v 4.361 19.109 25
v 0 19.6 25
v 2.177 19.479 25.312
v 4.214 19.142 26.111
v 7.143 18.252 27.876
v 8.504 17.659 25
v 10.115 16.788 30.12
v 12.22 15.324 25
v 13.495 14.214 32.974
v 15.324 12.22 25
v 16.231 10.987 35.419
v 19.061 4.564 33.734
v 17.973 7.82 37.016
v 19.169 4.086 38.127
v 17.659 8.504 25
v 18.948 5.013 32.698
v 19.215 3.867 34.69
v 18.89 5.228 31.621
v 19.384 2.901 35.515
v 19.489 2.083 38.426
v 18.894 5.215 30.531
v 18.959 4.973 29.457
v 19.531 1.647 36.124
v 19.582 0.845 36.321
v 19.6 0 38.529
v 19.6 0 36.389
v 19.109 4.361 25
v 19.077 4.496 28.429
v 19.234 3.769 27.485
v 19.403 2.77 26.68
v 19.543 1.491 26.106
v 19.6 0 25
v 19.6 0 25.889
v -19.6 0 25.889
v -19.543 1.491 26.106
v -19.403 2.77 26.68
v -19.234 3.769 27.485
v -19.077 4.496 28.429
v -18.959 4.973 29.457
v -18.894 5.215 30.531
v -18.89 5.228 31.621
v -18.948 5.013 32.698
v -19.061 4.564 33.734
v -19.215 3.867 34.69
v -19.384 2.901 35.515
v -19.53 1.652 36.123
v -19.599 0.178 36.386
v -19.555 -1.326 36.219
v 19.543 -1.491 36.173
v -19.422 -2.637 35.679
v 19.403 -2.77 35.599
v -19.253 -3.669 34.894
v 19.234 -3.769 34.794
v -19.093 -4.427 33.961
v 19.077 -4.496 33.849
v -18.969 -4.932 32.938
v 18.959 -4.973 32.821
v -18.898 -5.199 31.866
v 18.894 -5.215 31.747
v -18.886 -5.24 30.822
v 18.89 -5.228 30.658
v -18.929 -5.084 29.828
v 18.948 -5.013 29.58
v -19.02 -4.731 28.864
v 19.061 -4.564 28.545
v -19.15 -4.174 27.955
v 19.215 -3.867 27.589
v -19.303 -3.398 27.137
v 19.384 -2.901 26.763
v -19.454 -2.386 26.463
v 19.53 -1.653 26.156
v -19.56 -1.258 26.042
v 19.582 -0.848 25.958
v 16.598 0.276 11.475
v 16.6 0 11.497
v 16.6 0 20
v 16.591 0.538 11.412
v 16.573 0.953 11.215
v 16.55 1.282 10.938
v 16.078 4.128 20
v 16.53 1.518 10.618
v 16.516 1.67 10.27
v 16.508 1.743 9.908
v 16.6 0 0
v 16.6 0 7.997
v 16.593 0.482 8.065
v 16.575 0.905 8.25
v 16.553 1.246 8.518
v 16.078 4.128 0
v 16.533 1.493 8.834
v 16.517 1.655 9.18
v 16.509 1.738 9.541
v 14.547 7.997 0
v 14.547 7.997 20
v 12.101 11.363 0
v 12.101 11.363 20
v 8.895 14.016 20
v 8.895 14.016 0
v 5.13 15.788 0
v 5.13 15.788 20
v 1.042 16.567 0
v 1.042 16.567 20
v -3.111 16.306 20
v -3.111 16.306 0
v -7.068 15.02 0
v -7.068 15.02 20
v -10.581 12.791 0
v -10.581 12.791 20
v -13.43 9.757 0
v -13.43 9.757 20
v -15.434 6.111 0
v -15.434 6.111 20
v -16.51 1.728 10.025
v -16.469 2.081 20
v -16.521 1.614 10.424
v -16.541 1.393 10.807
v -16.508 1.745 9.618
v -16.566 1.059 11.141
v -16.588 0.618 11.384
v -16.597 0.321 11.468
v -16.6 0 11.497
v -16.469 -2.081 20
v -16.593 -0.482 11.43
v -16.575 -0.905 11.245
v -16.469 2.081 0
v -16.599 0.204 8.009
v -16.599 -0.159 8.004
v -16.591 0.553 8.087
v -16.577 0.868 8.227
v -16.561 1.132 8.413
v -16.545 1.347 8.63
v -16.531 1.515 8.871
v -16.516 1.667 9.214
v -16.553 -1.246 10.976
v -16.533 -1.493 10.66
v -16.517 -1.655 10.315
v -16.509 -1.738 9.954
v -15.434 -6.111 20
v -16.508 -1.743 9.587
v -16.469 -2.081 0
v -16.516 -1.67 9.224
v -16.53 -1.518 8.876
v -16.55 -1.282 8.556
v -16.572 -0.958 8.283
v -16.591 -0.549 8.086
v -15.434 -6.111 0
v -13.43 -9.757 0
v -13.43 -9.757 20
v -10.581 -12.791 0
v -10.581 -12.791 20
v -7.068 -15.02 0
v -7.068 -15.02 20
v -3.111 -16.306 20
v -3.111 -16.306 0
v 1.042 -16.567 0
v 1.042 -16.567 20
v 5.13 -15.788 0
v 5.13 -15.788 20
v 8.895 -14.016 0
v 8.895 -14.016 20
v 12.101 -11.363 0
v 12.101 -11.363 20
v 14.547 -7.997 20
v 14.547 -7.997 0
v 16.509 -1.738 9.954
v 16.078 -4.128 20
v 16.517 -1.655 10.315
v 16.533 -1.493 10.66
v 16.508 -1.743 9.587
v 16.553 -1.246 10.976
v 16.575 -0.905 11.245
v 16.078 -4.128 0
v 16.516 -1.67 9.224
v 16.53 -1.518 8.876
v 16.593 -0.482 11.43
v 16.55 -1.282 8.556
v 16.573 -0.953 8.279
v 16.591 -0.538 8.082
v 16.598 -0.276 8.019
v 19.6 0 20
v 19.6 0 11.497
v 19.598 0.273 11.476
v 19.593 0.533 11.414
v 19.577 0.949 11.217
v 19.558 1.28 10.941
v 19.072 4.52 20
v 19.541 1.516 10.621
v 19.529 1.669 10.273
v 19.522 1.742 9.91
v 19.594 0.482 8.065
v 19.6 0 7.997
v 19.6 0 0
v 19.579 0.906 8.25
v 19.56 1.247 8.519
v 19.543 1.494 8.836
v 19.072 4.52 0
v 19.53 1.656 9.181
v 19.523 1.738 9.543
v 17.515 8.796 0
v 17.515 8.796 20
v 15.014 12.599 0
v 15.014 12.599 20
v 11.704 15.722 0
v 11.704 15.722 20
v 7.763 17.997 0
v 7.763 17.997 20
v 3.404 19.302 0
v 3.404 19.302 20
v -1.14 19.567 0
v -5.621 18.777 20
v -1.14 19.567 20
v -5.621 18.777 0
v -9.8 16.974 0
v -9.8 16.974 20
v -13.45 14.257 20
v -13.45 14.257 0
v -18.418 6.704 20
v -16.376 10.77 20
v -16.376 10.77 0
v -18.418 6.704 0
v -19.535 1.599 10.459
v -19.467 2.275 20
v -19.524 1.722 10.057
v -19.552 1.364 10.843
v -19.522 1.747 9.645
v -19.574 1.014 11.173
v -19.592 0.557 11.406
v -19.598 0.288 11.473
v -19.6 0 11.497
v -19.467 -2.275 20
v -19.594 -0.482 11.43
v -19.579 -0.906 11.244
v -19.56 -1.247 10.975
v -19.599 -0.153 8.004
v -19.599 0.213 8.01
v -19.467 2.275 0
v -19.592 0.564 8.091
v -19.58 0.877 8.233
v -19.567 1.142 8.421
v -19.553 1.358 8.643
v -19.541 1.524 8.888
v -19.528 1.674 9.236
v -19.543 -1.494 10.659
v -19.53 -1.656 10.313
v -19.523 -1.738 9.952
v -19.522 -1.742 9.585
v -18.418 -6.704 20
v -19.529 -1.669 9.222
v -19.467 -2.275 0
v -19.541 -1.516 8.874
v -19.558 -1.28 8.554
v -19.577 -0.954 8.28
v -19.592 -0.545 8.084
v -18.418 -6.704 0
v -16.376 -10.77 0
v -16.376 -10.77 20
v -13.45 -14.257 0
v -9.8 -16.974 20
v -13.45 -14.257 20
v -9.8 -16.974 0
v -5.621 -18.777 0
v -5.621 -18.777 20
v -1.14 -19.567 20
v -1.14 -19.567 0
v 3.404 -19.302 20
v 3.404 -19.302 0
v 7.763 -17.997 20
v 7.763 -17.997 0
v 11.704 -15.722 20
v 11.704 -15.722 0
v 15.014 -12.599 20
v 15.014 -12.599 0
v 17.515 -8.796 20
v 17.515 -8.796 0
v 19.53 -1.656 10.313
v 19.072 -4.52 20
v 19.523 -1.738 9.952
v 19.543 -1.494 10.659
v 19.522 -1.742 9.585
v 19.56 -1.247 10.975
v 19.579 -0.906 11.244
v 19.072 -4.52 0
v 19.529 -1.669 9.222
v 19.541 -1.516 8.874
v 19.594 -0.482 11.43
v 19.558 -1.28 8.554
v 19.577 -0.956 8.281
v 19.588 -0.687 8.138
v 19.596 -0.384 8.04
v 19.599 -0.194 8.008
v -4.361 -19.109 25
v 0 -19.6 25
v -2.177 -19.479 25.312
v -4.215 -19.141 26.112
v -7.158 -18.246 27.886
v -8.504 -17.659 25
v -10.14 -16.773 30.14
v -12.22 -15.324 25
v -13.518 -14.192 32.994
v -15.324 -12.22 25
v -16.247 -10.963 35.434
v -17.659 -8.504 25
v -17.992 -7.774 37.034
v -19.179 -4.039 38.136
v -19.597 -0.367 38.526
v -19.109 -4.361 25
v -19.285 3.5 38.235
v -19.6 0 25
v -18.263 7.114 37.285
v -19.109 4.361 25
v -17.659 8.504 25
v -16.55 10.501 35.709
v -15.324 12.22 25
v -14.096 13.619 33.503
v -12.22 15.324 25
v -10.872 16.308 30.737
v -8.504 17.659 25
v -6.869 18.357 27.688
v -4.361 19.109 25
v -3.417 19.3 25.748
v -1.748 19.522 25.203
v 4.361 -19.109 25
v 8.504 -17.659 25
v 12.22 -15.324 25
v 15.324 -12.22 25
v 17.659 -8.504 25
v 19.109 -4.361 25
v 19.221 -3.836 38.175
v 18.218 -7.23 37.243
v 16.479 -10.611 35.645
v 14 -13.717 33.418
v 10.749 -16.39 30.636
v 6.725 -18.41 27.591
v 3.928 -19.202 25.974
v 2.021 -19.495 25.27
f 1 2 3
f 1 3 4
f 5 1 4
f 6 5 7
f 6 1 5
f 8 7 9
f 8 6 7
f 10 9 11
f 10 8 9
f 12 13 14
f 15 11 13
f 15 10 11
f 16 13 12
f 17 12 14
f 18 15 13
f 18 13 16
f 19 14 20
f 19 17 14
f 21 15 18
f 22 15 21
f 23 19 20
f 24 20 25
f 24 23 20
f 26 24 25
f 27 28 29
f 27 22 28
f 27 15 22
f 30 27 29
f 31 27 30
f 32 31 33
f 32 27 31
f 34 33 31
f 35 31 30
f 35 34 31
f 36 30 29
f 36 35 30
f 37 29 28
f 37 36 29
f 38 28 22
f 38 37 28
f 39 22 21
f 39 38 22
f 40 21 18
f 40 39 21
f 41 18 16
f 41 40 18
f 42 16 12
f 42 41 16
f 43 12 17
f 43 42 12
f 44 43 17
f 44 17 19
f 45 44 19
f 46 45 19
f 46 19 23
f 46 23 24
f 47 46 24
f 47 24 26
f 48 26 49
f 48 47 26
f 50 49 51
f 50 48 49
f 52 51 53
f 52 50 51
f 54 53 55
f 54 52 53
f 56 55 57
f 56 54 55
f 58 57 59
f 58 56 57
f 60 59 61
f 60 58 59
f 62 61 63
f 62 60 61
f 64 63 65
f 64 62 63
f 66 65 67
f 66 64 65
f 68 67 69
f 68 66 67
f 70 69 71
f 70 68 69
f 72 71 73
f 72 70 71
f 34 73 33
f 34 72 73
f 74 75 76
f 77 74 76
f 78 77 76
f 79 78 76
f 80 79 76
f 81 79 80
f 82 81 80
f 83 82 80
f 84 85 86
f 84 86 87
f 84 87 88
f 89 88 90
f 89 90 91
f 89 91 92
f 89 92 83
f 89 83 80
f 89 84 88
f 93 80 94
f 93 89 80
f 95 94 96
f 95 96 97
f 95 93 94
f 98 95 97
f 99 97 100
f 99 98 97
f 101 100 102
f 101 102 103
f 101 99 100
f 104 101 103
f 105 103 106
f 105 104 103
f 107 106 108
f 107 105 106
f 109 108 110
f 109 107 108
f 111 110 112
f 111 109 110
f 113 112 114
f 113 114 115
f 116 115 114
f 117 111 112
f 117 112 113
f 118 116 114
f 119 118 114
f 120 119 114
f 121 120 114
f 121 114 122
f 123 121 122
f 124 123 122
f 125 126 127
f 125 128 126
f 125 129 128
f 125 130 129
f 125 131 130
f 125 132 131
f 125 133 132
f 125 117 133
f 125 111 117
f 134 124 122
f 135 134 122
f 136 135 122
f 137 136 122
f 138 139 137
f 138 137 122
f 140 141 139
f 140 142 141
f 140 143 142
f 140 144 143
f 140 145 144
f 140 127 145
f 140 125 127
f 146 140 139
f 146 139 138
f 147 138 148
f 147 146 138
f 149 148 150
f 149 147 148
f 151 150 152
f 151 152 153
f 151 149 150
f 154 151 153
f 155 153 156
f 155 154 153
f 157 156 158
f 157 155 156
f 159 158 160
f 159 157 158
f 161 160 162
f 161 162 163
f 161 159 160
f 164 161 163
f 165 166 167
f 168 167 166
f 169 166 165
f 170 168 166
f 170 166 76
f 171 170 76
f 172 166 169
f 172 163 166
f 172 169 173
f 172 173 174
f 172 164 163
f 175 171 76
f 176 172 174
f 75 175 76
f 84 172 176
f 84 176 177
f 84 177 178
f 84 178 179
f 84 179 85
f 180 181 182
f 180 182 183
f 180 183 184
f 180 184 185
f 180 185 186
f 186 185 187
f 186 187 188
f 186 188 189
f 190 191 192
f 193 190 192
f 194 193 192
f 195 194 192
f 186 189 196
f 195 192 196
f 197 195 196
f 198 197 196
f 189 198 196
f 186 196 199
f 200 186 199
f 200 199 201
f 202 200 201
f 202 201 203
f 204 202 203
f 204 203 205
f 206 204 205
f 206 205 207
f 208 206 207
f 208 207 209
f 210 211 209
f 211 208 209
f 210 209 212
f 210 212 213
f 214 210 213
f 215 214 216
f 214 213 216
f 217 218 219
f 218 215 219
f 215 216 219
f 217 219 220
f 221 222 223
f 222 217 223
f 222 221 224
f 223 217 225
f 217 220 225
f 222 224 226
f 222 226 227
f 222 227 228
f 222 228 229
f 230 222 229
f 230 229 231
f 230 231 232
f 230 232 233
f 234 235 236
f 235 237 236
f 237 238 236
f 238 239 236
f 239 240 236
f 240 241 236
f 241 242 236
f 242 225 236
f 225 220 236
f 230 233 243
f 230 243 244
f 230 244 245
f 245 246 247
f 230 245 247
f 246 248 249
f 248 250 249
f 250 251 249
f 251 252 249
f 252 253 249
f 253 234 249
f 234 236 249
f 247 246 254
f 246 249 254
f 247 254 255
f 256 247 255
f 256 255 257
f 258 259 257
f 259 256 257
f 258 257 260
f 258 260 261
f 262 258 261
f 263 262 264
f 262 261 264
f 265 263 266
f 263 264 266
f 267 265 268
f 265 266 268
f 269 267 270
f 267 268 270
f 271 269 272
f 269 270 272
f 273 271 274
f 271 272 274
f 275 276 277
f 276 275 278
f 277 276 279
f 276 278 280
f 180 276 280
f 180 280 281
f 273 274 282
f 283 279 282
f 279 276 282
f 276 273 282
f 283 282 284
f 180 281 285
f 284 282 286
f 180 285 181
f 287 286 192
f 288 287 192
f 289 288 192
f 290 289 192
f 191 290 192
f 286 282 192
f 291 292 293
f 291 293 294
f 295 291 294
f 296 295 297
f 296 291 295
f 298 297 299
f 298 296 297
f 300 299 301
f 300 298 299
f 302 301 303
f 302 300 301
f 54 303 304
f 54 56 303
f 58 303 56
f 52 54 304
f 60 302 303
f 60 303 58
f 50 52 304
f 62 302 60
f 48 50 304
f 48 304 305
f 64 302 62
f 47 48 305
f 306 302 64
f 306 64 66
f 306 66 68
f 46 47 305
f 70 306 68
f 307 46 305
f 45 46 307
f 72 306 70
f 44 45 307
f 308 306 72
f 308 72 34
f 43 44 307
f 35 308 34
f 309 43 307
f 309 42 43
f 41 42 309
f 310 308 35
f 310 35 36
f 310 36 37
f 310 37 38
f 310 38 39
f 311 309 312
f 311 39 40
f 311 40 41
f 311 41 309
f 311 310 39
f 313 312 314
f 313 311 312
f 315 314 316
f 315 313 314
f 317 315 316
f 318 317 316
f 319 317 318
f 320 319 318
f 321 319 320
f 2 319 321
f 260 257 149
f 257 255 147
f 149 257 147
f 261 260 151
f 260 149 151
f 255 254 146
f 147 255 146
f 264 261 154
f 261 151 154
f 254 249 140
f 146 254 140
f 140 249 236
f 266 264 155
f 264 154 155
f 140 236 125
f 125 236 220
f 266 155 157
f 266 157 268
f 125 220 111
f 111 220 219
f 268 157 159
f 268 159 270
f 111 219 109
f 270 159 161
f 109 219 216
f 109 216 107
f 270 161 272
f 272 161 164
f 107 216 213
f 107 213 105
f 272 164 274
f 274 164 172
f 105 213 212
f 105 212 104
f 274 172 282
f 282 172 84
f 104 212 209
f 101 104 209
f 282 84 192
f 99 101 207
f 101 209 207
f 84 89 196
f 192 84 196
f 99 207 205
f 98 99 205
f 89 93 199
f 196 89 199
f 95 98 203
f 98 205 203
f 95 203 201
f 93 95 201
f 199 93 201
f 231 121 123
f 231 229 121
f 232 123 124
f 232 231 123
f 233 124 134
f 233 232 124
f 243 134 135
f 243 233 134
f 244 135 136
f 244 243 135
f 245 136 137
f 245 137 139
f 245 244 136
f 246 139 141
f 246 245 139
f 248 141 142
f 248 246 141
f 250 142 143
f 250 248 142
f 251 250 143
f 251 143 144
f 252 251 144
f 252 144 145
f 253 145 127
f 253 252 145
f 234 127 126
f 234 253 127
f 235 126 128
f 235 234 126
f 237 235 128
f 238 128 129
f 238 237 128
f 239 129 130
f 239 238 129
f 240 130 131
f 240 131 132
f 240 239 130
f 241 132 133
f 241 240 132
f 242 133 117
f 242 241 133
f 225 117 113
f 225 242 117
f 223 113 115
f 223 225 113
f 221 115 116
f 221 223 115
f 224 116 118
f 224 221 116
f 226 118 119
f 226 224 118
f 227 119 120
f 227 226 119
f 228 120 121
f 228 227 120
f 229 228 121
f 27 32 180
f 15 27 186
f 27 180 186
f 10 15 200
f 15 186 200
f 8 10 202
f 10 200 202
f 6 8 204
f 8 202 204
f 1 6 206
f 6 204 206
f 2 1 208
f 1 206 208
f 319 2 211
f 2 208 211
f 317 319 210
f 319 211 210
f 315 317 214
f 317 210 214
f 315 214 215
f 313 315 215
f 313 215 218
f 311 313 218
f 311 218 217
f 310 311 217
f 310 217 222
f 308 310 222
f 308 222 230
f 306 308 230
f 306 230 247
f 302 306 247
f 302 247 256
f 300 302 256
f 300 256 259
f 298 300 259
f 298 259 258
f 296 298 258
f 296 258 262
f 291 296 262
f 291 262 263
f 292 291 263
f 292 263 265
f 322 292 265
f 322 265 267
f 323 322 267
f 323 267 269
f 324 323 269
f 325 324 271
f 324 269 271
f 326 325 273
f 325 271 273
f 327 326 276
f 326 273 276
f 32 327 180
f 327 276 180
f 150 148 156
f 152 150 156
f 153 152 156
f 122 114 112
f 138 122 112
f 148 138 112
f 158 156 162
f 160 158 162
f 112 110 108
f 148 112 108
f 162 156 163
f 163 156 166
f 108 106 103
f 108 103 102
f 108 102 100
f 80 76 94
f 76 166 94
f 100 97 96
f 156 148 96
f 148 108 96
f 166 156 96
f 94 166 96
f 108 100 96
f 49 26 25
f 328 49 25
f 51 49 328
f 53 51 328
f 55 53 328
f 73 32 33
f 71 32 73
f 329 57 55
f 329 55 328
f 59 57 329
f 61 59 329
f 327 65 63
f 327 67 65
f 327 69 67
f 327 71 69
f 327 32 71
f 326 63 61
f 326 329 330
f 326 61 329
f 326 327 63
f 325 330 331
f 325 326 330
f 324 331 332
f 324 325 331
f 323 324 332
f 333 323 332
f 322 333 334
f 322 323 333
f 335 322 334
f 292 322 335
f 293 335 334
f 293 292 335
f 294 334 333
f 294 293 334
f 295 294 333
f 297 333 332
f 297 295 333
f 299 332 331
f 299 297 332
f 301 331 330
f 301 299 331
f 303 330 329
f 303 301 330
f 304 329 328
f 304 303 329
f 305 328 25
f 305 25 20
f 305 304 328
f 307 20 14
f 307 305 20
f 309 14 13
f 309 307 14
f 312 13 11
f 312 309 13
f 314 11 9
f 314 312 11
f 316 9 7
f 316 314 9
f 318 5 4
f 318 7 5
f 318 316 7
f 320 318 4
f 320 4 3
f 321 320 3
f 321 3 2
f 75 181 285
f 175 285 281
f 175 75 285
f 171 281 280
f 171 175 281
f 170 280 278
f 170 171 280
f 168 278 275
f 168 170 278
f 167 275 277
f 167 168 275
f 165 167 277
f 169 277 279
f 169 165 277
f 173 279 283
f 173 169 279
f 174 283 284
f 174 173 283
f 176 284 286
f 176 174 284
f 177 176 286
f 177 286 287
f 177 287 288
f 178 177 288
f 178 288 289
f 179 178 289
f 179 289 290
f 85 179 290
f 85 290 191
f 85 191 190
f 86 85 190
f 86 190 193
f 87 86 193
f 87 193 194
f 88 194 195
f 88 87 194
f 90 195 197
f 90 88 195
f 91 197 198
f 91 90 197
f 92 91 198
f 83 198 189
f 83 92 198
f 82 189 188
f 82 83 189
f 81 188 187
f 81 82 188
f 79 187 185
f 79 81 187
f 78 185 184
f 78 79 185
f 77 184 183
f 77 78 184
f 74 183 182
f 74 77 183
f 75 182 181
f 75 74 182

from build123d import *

# Parameters (mm, degrees)
SKETCH1_R                = 19.6
SKETCH1_R_2              = 16.6
BOSS_EXTRUDE1_DEPTH      = 20
SKETCH2_R                = 19.6
BOSS_EXTRUDE2_DEPTH      = 5
BOSS_EXTRUDE4_DEPTH      = 25
BOSS_EXTRUDE4_DEPTH_BACK = 25
SKETCH3_R                = 5.25
SKETCH4_R                = 39.6
SKETCH4_R_2              = 19.6
CUT_EXTRUDE_THIN1_DEPTH  = 25
CUT_EXTRUDE1_DEPTH       = 25
CUT_EXTRUDE1_DEPTH_BACK  = 25
SKETCH6_R                = 1.75


with BuildPart() as part:
    # Sketch1 → Boss-Extrude1 (new body)
    with BuildSketch(Plane(origin=(0, 0, 0), x_dir=(0, 1, 0), z_dir=(0, 0, 1))):
        with Locations(Location((0, 0, 0), (0, 0, 270))):
            Circle(SKETCH1_R)
        with Locations(Location((0, 0, 0), (0, 0, 270))):
            Circle(SKETCH1_R_2, mode=Mode.SUBTRACT)
    extrude(amount=BOSS_EXTRUDE1_DEPTH)

    # Sketch2 → Boss-Extrude2 (add)
    with BuildSketch(Plane.XY.offset(20)):
        Circle(SKETCH2_R)
    extrude(amount=BOSS_EXTRUDE2_DEPTH)

    # Sketch3 → Boss-Extrude4 (add, two sides: drawn at the far end of the back side and taken through both)
    with BuildSketch(Plane.YZ.offset(-BOSS_EXTRUDE4_DEPTH_BACK)):
        with BuildLine():
            Line((19.6, 25), (0, 25))
            Line((0, 25), (-19.6, 25))
            ThreePointArc((-19.6, 25), (0, 38.529292798), (19.6, 25))
        make_face()
        with Locations(Location((0, 31.139297983, 0), (0, 0, 270))):
            Circle(SKETCH3_R, mode=Mode.SUBTRACT)
    extrude(amount=BOSS_EXTRUDE4_DEPTH + BOSS_EXTRUDE4_DEPTH_BACK)

    # Sketch4 → Cut-Extrude-Thin1 (cut)
    with BuildSketch(Plane(origin=(0, 0, 20), x_dir=(1, 0, 0), z_dir=(0, 0, -1))):
        Circle(SKETCH4_R)
        Circle(SKETCH4_R_2, mode=Mode.SUBTRACT)
    extrude(amount=-CUT_EXTRUDE_THIN1_DEPTH, mode=Mode.SUBTRACT)

    # Sketch6 → Cut-Extrude1 (cut, two sides: drawn at the far end of the back side and taken through both)
    with BuildSketch(Plane.YZ.offset(-CUT_EXTRUDE1_DEPTH_BACK)):
        with Locations(Location((0, 9.747221623, 0), (0, 0, 90))):
            Circle(SKETCH6_R)
    extrude(amount=CUT_EXTRUDE1_DEPTH + CUT_EXTRUDE1_DEPTH_BACK, mode=Mode.SUBTRACT)


solid = part.part
